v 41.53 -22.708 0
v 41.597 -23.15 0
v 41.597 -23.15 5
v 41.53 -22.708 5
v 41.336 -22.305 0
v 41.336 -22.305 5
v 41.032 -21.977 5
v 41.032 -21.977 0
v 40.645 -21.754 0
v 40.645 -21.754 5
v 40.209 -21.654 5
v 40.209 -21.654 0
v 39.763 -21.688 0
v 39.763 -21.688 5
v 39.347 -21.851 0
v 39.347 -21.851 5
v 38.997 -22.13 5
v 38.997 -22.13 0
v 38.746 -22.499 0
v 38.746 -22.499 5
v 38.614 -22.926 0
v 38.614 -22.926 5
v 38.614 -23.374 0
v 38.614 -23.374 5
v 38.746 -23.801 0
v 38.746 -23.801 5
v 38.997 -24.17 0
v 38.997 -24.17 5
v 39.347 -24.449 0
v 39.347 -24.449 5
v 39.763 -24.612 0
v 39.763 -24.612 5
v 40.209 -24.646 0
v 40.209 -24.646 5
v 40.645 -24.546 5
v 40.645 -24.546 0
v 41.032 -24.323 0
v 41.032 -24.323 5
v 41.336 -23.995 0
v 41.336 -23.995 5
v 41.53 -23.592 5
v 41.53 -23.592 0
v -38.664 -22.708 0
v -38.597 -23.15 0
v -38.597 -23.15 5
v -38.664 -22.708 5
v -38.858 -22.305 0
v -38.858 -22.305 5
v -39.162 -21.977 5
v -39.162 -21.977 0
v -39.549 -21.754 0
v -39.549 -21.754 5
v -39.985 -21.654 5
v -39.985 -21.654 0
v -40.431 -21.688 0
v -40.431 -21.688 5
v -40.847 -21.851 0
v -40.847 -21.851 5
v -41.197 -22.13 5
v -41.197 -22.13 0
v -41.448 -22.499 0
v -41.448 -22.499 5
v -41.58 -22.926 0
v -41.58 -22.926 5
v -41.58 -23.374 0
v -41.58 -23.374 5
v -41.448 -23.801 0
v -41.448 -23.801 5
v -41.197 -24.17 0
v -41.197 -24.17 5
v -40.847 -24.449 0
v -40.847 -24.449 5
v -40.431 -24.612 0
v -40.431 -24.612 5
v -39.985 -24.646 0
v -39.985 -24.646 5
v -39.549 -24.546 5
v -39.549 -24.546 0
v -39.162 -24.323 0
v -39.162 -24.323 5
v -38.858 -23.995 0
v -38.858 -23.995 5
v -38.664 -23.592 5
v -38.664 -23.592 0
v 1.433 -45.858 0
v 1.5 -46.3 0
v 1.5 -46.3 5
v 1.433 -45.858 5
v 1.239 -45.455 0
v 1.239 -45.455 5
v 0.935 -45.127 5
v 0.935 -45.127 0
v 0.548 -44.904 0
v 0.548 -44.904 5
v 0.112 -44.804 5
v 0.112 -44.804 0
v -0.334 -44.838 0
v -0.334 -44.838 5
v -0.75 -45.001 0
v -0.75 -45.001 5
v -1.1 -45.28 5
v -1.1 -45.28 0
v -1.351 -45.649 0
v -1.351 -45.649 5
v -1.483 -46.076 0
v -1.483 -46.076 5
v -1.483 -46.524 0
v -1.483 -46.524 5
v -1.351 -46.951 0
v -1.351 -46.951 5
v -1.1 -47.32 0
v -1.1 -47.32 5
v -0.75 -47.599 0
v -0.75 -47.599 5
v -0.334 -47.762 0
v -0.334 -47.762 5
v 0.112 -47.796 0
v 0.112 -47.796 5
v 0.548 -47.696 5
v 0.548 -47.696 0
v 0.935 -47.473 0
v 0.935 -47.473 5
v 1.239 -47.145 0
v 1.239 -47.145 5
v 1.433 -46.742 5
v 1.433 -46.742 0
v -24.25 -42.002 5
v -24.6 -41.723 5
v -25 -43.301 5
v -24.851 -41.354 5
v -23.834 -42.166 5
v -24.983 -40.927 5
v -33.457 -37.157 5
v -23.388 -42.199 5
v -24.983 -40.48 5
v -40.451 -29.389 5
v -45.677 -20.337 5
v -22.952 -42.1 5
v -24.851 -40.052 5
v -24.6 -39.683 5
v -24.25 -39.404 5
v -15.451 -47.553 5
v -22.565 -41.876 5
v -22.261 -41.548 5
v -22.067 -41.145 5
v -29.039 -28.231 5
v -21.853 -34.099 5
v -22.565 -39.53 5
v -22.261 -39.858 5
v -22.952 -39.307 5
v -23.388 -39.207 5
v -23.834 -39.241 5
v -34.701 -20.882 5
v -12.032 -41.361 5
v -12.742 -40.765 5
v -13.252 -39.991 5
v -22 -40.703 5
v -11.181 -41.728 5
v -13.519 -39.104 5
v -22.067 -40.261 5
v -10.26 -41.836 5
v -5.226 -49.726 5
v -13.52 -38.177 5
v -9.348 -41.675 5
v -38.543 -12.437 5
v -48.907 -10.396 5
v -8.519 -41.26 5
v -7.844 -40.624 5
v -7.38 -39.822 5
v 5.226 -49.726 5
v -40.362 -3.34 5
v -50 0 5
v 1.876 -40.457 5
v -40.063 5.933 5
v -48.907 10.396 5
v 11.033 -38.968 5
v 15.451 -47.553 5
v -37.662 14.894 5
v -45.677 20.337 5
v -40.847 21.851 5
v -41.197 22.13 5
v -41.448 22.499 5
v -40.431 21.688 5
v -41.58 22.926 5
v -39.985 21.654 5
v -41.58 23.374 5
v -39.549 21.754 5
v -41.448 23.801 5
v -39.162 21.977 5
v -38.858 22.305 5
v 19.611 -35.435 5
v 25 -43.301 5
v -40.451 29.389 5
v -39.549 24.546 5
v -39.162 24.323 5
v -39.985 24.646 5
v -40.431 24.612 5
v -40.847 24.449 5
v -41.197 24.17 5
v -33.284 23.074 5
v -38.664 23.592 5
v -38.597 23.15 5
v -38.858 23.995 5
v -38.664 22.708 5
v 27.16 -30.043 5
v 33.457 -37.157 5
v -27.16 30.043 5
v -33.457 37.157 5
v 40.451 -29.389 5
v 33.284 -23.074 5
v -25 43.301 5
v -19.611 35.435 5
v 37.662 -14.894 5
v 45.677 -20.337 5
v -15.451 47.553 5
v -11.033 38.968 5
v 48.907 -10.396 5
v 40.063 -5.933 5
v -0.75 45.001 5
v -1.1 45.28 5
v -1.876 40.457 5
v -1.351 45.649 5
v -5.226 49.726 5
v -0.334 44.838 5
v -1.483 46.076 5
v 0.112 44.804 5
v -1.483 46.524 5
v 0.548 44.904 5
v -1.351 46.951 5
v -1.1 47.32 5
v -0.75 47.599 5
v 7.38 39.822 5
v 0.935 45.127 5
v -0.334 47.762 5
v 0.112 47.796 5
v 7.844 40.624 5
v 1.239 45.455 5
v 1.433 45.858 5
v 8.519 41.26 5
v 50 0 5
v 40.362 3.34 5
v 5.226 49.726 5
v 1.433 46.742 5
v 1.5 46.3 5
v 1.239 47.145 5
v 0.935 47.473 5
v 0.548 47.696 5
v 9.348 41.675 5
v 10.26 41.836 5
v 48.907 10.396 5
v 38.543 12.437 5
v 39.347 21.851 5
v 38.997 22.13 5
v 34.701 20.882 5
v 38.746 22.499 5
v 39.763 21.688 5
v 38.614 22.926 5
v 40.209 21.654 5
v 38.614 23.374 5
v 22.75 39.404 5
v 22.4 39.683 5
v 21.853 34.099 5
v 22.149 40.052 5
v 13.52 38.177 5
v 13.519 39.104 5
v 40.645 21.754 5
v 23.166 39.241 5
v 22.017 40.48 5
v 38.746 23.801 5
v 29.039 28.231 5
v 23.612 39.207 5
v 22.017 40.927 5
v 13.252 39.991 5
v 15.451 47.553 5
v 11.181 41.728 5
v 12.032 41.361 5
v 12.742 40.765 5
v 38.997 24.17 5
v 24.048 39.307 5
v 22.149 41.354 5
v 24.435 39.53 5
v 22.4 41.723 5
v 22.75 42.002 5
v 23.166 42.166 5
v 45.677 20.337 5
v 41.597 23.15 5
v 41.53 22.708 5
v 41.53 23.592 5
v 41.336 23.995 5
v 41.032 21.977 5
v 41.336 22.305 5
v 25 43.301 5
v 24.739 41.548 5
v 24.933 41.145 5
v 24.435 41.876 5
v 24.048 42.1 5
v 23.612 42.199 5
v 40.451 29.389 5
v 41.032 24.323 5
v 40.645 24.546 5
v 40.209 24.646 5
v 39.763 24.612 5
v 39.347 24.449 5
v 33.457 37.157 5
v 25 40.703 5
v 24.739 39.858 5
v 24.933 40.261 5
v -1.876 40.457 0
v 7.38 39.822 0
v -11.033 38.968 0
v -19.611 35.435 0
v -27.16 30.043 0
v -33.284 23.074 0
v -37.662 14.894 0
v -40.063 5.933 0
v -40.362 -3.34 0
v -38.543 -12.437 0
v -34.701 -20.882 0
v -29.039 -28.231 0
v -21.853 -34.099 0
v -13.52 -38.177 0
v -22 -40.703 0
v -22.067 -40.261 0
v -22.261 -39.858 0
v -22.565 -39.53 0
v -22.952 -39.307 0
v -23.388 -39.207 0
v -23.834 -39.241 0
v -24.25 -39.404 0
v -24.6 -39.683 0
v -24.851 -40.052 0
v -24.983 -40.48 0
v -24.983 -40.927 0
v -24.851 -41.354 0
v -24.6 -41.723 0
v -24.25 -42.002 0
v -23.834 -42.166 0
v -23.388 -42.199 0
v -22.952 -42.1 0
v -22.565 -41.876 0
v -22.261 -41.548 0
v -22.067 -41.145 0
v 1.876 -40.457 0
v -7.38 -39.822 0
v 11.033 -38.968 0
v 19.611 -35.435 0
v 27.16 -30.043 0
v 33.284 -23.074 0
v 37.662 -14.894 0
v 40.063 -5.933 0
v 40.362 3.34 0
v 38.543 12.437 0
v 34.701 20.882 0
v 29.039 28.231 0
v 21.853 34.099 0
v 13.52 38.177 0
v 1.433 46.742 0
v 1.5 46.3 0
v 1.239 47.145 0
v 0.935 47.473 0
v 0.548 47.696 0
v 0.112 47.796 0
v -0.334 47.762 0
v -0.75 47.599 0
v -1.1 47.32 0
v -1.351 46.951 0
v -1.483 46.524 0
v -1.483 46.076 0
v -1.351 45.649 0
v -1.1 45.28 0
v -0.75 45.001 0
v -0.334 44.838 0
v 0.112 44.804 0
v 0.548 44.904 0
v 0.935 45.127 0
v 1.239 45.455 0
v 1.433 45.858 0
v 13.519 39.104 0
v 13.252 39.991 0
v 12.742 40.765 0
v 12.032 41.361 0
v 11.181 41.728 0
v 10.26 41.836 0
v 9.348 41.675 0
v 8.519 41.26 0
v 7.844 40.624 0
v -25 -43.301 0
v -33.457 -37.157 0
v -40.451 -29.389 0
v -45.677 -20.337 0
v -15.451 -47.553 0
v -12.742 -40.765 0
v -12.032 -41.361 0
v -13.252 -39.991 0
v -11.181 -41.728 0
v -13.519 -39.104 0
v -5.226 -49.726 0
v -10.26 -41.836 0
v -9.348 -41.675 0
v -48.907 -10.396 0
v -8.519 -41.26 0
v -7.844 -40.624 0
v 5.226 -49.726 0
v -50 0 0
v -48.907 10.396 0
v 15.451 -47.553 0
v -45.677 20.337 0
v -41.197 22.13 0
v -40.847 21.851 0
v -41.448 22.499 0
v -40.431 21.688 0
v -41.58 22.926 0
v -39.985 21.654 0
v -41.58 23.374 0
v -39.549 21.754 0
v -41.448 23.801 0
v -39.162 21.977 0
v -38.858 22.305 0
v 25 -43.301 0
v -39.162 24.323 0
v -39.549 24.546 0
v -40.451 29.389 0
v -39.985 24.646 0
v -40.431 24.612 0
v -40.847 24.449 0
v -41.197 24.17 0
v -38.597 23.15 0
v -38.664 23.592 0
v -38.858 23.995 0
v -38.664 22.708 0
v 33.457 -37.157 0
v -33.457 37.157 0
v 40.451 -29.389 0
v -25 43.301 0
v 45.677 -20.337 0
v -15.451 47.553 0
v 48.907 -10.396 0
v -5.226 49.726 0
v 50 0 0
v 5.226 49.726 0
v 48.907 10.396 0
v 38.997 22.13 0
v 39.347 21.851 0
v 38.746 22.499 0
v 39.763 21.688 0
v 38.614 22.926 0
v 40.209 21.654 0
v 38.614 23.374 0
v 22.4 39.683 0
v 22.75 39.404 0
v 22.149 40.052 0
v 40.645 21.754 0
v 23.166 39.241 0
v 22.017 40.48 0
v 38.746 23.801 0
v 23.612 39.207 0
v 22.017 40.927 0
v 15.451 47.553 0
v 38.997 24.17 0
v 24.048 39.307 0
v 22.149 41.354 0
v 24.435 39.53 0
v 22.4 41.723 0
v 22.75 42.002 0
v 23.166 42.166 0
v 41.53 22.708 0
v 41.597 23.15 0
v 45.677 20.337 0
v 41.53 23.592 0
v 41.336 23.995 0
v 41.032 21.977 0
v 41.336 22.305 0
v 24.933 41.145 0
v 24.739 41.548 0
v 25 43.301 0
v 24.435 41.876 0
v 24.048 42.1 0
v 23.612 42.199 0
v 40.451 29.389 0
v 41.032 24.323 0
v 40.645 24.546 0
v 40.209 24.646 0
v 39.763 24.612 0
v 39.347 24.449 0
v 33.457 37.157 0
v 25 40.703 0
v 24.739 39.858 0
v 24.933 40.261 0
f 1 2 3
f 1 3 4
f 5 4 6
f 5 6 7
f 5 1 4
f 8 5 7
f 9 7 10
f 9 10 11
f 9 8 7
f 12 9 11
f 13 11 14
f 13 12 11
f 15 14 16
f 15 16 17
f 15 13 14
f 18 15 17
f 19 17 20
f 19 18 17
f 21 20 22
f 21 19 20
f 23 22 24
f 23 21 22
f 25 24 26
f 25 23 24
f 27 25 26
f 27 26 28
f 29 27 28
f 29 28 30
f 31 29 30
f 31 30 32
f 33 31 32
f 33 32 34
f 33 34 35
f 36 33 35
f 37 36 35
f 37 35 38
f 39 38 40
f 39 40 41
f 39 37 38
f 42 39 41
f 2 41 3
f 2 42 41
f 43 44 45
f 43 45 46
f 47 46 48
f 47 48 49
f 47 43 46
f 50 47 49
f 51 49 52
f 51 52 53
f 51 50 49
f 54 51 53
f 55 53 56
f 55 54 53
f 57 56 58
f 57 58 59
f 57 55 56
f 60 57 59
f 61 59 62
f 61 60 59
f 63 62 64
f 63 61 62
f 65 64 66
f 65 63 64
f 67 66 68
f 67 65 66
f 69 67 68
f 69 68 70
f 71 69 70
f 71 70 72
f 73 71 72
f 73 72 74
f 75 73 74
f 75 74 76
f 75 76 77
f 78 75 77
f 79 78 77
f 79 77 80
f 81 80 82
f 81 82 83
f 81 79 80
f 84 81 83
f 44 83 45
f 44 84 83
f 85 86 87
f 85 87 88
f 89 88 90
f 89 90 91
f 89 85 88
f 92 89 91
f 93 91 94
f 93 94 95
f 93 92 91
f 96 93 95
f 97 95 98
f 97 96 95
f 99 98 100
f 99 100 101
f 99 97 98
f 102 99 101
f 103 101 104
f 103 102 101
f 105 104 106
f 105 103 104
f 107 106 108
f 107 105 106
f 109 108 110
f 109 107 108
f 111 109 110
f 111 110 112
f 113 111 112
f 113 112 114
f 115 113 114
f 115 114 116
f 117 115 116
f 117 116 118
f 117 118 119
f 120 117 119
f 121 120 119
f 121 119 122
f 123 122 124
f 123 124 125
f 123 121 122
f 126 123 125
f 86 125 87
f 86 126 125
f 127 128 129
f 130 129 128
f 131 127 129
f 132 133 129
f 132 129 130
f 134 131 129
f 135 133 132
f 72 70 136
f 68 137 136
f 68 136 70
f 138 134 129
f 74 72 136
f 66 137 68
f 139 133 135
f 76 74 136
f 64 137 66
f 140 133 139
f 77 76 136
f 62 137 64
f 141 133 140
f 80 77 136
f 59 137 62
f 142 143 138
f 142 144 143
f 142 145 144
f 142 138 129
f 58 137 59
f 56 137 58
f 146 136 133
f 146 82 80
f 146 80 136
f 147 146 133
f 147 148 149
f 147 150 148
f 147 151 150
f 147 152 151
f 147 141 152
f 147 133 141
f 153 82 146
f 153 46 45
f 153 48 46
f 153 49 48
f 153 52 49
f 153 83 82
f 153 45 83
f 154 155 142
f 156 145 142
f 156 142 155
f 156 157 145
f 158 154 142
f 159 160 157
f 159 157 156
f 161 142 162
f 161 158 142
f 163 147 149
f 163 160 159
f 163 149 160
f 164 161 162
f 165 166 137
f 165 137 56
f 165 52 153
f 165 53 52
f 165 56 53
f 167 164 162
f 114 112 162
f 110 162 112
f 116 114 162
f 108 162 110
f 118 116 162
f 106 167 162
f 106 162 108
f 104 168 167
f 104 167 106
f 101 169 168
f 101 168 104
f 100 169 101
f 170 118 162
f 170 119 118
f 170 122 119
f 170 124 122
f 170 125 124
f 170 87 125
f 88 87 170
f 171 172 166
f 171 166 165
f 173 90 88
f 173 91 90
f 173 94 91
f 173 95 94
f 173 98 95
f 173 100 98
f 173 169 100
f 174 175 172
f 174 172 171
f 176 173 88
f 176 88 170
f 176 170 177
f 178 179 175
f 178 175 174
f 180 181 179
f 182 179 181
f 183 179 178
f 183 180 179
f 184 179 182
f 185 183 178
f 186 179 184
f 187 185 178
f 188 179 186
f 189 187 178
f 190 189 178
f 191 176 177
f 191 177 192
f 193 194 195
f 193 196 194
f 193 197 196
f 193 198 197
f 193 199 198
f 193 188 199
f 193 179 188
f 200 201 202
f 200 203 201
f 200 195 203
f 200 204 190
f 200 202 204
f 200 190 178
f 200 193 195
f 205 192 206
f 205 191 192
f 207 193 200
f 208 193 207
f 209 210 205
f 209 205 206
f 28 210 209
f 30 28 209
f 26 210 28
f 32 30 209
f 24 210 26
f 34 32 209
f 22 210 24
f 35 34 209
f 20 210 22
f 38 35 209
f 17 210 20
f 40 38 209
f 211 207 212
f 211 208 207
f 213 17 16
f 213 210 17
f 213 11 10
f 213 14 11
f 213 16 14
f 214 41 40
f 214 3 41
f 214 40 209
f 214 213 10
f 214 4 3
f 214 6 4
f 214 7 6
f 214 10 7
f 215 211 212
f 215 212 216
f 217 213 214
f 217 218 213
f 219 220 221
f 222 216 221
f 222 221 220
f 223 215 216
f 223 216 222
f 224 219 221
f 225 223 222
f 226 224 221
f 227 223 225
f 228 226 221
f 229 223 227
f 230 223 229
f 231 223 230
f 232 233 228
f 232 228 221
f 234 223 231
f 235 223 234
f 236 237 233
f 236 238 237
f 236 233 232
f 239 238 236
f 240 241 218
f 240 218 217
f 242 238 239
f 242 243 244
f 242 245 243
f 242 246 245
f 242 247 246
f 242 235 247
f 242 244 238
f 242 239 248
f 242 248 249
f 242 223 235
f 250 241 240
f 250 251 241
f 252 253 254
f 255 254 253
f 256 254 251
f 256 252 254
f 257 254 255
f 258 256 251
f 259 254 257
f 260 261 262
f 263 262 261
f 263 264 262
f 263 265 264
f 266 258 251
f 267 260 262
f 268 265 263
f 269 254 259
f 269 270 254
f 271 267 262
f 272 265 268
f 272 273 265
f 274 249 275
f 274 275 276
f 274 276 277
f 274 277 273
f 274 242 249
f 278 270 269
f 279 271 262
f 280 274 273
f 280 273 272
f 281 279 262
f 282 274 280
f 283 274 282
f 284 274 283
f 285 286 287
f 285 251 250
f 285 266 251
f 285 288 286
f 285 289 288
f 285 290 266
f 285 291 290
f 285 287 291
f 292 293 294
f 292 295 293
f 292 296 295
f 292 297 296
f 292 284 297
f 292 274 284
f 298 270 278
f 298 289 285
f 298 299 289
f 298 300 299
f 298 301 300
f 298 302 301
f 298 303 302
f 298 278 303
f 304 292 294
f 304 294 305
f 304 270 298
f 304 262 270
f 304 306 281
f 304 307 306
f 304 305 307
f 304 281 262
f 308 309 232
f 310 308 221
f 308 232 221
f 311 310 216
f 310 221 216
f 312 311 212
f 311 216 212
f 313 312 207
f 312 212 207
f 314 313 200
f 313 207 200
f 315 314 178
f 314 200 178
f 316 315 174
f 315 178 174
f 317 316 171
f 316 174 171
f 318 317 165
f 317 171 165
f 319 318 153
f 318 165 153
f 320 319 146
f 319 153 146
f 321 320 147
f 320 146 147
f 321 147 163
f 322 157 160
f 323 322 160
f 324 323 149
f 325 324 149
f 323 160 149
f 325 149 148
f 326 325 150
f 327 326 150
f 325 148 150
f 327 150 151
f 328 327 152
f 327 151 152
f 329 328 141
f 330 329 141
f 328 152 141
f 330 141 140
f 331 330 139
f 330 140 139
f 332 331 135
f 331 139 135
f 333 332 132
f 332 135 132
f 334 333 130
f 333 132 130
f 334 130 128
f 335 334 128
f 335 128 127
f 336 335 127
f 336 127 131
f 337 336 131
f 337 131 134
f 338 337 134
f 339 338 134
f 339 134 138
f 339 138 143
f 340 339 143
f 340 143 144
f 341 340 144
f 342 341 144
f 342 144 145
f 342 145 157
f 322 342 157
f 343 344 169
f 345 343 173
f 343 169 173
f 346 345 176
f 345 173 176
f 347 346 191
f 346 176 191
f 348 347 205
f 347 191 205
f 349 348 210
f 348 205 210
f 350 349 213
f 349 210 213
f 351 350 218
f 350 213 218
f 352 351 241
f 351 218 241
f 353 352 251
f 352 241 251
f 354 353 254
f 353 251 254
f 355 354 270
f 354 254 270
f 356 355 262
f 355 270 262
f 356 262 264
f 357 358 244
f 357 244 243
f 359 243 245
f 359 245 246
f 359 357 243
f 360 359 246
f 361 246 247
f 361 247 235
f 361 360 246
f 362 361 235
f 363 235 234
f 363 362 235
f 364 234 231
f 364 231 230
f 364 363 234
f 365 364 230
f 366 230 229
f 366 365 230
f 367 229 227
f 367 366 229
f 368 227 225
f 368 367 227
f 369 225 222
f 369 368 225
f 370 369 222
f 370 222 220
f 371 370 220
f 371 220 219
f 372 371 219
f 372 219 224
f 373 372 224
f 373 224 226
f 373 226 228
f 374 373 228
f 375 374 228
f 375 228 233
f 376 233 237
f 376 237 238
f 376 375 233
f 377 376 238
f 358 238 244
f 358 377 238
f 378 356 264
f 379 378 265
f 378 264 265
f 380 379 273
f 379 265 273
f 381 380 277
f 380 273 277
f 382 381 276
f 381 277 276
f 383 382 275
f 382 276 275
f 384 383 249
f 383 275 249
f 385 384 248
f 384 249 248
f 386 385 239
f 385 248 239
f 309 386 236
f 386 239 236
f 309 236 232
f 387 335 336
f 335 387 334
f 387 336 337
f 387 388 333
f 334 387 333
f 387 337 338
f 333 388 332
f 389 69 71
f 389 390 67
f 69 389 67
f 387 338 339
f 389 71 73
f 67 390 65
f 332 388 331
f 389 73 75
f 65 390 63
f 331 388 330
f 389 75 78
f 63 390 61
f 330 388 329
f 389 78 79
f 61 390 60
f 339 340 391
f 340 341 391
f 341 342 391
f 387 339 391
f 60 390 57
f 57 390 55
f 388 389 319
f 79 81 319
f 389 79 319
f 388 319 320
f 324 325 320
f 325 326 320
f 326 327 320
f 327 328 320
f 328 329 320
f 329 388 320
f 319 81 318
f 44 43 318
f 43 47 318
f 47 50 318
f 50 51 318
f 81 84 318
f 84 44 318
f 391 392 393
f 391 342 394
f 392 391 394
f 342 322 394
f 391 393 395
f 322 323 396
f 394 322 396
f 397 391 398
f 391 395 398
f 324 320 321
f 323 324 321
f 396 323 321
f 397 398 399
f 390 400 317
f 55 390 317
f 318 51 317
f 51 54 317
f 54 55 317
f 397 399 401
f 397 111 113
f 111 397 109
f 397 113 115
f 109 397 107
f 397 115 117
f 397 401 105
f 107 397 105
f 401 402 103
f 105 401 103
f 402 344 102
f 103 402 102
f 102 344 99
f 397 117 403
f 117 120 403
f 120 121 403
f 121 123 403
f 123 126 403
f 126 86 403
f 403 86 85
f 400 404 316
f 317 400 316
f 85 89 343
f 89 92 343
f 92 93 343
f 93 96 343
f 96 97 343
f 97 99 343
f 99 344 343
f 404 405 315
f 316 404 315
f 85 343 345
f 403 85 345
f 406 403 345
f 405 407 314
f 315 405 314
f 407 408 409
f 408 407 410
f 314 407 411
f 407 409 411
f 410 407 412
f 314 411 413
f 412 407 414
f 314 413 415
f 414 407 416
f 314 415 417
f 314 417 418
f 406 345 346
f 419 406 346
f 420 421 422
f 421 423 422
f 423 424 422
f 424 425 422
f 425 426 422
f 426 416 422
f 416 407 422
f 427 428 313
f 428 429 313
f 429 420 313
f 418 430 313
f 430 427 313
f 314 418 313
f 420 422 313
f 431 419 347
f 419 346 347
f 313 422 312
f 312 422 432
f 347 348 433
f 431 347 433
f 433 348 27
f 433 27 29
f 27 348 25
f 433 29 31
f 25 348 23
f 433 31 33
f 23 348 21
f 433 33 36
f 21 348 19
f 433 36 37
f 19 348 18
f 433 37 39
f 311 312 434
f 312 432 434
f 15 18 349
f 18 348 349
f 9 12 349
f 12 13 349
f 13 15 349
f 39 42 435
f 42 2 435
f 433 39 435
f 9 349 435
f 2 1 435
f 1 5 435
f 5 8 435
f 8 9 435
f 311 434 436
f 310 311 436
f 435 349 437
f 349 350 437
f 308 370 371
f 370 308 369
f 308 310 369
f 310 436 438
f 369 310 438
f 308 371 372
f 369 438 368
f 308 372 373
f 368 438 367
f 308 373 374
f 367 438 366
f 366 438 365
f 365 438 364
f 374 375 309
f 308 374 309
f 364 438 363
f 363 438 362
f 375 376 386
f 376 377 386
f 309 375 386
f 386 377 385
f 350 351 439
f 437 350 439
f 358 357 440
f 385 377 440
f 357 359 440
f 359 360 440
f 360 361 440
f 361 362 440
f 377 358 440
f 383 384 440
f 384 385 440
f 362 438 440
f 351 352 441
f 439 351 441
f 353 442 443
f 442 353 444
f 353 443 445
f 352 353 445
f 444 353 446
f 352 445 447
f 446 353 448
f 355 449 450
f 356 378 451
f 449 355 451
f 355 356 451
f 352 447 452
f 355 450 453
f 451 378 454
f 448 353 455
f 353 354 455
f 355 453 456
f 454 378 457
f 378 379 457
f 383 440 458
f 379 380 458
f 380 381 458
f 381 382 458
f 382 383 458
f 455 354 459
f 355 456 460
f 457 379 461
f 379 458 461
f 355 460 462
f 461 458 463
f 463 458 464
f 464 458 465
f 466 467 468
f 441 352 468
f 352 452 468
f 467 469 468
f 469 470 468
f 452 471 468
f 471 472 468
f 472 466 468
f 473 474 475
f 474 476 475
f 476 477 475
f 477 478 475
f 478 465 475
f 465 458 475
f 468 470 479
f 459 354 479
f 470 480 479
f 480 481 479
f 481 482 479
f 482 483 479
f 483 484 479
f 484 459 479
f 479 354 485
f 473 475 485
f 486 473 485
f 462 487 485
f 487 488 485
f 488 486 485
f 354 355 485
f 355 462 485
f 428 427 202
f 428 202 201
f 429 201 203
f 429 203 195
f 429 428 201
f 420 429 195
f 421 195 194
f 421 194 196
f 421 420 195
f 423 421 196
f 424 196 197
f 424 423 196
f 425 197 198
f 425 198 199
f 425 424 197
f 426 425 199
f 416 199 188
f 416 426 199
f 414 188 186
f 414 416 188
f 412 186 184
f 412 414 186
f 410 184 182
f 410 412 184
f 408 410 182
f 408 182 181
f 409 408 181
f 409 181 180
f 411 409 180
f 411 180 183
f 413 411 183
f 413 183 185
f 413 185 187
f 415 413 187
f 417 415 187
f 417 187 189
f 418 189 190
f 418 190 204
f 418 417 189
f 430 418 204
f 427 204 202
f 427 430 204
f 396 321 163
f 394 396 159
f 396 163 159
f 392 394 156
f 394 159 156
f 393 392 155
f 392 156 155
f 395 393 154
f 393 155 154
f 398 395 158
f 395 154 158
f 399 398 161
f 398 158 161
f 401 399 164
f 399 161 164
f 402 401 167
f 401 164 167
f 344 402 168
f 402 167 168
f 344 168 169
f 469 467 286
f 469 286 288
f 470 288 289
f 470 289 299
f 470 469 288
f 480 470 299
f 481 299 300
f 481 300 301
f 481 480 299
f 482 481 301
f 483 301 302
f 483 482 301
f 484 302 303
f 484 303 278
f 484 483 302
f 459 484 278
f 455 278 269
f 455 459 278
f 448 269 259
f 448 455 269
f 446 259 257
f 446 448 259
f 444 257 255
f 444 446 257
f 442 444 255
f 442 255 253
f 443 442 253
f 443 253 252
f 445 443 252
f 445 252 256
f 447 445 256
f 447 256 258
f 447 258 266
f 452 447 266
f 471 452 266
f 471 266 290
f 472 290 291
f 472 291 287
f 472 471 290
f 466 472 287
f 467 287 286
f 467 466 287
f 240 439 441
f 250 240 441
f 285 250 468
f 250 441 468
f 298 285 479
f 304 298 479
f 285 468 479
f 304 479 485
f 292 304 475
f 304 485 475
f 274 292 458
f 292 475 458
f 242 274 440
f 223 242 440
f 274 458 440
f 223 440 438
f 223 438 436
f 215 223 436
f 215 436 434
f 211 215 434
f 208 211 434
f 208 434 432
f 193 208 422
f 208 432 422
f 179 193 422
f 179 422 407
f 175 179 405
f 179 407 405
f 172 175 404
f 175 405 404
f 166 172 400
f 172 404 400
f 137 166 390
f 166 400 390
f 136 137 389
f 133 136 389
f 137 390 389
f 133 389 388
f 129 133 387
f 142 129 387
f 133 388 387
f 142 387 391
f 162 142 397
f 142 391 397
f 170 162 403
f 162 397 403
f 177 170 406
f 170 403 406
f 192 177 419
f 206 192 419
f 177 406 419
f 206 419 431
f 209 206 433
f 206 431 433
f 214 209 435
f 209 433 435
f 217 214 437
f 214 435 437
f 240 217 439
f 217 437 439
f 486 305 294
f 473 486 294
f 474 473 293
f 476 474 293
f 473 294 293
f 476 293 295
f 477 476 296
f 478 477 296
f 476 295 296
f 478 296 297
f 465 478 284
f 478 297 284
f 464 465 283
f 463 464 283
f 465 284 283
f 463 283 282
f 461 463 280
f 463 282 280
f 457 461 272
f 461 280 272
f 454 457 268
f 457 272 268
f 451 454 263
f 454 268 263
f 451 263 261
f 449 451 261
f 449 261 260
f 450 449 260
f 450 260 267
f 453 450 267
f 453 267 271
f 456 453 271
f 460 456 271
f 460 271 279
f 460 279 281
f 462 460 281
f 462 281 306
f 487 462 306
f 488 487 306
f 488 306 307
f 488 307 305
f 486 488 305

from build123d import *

# Parameters (mm, degrees)
ESQUISSE1_R        = 50
ESQUISSE1_R_2      = 1.5
BOSS_EXTRU_1_DEPTH = 5
SKETCH4_R          = 1.5
CUT_EXTRUDE4_DEPTH = 10
SKETCH5_R          = 40.5
CUT_EXTRUDE5_DEPTH = 10
SKETCH6_R          = 3.2
CUT_EXTRUDE6_DEPTH = 10


with BuildPart() as part:
    # Esquisse1 → Boss.-Extru.1 (new body)
    with BuildSketch(Plane.XY):
        Circle(ESQUISSE1_R)
        with Locations((-40.096976195, -23.15)):
            Circle(ESQUISSE1_R_2, mode=Mode.SUBTRACT)
        with Locations((-40.096976195, 23.15)):
            Circle(ESQUISSE1_R_2, mode=Mode.SUBTRACT)
        with Locations((0, 46.3)):
            Circle(ESQUISSE1_R_2, mode=Mode.SUBTRACT)
        with Locations((40.096976195, 23.15)):
            Circle(ESQUISSE1_R_2, mode=Mode.SUBTRACT)
        with Locations((40.096976195, -23.15)):
            Circle(ESQUISSE1_R_2, mode=Mode.SUBTRACT)
        with Locations((0, -46.3)):
            Circle(ESQUISSE1_R_2, mode=Mode.SUBTRACT)
    extrude(amount=BOSS_EXTRU_1_DEPTH)

    # Sketch4 → Cut-Extrude4 (cut)
    with BuildSketch(Plane.XY.offset(5)):
        with Locations((-23.5, -40.703193978)):
            Circle(SKETCH4_R)
        with Locations((23.5, 40.703193978)):
            Circle(SKETCH4_R)
    extrude(amount=-CUT_EXTRUDE4_DEPTH, mode=Mode.SUBTRACT)

    # Sketch5 → Cut-Extrude5 (cut)
    with BuildSketch(Plane.XY.offset(5)):
        Circle(SKETCH5_R)
    extrude(amount=-CUT_EXTRUDE5_DEPTH, mode=Mode.SUBTRACT)

    # Sketch6 → Cut-Extrude6 (cut)
    with BuildSketch(Plane.XY.offset(5)):
        with Locations((10.352761804, 38.637033052)):
            Circle(SKETCH6_R)
        with Locations((-10.352761804, -38.637033052)):
            Circle(SKETCH6_R)
    extrude(amount=-CUT_EXTRUDE6_DEPTH, mode=Mode.SUBTRACT)


solid = part.part
